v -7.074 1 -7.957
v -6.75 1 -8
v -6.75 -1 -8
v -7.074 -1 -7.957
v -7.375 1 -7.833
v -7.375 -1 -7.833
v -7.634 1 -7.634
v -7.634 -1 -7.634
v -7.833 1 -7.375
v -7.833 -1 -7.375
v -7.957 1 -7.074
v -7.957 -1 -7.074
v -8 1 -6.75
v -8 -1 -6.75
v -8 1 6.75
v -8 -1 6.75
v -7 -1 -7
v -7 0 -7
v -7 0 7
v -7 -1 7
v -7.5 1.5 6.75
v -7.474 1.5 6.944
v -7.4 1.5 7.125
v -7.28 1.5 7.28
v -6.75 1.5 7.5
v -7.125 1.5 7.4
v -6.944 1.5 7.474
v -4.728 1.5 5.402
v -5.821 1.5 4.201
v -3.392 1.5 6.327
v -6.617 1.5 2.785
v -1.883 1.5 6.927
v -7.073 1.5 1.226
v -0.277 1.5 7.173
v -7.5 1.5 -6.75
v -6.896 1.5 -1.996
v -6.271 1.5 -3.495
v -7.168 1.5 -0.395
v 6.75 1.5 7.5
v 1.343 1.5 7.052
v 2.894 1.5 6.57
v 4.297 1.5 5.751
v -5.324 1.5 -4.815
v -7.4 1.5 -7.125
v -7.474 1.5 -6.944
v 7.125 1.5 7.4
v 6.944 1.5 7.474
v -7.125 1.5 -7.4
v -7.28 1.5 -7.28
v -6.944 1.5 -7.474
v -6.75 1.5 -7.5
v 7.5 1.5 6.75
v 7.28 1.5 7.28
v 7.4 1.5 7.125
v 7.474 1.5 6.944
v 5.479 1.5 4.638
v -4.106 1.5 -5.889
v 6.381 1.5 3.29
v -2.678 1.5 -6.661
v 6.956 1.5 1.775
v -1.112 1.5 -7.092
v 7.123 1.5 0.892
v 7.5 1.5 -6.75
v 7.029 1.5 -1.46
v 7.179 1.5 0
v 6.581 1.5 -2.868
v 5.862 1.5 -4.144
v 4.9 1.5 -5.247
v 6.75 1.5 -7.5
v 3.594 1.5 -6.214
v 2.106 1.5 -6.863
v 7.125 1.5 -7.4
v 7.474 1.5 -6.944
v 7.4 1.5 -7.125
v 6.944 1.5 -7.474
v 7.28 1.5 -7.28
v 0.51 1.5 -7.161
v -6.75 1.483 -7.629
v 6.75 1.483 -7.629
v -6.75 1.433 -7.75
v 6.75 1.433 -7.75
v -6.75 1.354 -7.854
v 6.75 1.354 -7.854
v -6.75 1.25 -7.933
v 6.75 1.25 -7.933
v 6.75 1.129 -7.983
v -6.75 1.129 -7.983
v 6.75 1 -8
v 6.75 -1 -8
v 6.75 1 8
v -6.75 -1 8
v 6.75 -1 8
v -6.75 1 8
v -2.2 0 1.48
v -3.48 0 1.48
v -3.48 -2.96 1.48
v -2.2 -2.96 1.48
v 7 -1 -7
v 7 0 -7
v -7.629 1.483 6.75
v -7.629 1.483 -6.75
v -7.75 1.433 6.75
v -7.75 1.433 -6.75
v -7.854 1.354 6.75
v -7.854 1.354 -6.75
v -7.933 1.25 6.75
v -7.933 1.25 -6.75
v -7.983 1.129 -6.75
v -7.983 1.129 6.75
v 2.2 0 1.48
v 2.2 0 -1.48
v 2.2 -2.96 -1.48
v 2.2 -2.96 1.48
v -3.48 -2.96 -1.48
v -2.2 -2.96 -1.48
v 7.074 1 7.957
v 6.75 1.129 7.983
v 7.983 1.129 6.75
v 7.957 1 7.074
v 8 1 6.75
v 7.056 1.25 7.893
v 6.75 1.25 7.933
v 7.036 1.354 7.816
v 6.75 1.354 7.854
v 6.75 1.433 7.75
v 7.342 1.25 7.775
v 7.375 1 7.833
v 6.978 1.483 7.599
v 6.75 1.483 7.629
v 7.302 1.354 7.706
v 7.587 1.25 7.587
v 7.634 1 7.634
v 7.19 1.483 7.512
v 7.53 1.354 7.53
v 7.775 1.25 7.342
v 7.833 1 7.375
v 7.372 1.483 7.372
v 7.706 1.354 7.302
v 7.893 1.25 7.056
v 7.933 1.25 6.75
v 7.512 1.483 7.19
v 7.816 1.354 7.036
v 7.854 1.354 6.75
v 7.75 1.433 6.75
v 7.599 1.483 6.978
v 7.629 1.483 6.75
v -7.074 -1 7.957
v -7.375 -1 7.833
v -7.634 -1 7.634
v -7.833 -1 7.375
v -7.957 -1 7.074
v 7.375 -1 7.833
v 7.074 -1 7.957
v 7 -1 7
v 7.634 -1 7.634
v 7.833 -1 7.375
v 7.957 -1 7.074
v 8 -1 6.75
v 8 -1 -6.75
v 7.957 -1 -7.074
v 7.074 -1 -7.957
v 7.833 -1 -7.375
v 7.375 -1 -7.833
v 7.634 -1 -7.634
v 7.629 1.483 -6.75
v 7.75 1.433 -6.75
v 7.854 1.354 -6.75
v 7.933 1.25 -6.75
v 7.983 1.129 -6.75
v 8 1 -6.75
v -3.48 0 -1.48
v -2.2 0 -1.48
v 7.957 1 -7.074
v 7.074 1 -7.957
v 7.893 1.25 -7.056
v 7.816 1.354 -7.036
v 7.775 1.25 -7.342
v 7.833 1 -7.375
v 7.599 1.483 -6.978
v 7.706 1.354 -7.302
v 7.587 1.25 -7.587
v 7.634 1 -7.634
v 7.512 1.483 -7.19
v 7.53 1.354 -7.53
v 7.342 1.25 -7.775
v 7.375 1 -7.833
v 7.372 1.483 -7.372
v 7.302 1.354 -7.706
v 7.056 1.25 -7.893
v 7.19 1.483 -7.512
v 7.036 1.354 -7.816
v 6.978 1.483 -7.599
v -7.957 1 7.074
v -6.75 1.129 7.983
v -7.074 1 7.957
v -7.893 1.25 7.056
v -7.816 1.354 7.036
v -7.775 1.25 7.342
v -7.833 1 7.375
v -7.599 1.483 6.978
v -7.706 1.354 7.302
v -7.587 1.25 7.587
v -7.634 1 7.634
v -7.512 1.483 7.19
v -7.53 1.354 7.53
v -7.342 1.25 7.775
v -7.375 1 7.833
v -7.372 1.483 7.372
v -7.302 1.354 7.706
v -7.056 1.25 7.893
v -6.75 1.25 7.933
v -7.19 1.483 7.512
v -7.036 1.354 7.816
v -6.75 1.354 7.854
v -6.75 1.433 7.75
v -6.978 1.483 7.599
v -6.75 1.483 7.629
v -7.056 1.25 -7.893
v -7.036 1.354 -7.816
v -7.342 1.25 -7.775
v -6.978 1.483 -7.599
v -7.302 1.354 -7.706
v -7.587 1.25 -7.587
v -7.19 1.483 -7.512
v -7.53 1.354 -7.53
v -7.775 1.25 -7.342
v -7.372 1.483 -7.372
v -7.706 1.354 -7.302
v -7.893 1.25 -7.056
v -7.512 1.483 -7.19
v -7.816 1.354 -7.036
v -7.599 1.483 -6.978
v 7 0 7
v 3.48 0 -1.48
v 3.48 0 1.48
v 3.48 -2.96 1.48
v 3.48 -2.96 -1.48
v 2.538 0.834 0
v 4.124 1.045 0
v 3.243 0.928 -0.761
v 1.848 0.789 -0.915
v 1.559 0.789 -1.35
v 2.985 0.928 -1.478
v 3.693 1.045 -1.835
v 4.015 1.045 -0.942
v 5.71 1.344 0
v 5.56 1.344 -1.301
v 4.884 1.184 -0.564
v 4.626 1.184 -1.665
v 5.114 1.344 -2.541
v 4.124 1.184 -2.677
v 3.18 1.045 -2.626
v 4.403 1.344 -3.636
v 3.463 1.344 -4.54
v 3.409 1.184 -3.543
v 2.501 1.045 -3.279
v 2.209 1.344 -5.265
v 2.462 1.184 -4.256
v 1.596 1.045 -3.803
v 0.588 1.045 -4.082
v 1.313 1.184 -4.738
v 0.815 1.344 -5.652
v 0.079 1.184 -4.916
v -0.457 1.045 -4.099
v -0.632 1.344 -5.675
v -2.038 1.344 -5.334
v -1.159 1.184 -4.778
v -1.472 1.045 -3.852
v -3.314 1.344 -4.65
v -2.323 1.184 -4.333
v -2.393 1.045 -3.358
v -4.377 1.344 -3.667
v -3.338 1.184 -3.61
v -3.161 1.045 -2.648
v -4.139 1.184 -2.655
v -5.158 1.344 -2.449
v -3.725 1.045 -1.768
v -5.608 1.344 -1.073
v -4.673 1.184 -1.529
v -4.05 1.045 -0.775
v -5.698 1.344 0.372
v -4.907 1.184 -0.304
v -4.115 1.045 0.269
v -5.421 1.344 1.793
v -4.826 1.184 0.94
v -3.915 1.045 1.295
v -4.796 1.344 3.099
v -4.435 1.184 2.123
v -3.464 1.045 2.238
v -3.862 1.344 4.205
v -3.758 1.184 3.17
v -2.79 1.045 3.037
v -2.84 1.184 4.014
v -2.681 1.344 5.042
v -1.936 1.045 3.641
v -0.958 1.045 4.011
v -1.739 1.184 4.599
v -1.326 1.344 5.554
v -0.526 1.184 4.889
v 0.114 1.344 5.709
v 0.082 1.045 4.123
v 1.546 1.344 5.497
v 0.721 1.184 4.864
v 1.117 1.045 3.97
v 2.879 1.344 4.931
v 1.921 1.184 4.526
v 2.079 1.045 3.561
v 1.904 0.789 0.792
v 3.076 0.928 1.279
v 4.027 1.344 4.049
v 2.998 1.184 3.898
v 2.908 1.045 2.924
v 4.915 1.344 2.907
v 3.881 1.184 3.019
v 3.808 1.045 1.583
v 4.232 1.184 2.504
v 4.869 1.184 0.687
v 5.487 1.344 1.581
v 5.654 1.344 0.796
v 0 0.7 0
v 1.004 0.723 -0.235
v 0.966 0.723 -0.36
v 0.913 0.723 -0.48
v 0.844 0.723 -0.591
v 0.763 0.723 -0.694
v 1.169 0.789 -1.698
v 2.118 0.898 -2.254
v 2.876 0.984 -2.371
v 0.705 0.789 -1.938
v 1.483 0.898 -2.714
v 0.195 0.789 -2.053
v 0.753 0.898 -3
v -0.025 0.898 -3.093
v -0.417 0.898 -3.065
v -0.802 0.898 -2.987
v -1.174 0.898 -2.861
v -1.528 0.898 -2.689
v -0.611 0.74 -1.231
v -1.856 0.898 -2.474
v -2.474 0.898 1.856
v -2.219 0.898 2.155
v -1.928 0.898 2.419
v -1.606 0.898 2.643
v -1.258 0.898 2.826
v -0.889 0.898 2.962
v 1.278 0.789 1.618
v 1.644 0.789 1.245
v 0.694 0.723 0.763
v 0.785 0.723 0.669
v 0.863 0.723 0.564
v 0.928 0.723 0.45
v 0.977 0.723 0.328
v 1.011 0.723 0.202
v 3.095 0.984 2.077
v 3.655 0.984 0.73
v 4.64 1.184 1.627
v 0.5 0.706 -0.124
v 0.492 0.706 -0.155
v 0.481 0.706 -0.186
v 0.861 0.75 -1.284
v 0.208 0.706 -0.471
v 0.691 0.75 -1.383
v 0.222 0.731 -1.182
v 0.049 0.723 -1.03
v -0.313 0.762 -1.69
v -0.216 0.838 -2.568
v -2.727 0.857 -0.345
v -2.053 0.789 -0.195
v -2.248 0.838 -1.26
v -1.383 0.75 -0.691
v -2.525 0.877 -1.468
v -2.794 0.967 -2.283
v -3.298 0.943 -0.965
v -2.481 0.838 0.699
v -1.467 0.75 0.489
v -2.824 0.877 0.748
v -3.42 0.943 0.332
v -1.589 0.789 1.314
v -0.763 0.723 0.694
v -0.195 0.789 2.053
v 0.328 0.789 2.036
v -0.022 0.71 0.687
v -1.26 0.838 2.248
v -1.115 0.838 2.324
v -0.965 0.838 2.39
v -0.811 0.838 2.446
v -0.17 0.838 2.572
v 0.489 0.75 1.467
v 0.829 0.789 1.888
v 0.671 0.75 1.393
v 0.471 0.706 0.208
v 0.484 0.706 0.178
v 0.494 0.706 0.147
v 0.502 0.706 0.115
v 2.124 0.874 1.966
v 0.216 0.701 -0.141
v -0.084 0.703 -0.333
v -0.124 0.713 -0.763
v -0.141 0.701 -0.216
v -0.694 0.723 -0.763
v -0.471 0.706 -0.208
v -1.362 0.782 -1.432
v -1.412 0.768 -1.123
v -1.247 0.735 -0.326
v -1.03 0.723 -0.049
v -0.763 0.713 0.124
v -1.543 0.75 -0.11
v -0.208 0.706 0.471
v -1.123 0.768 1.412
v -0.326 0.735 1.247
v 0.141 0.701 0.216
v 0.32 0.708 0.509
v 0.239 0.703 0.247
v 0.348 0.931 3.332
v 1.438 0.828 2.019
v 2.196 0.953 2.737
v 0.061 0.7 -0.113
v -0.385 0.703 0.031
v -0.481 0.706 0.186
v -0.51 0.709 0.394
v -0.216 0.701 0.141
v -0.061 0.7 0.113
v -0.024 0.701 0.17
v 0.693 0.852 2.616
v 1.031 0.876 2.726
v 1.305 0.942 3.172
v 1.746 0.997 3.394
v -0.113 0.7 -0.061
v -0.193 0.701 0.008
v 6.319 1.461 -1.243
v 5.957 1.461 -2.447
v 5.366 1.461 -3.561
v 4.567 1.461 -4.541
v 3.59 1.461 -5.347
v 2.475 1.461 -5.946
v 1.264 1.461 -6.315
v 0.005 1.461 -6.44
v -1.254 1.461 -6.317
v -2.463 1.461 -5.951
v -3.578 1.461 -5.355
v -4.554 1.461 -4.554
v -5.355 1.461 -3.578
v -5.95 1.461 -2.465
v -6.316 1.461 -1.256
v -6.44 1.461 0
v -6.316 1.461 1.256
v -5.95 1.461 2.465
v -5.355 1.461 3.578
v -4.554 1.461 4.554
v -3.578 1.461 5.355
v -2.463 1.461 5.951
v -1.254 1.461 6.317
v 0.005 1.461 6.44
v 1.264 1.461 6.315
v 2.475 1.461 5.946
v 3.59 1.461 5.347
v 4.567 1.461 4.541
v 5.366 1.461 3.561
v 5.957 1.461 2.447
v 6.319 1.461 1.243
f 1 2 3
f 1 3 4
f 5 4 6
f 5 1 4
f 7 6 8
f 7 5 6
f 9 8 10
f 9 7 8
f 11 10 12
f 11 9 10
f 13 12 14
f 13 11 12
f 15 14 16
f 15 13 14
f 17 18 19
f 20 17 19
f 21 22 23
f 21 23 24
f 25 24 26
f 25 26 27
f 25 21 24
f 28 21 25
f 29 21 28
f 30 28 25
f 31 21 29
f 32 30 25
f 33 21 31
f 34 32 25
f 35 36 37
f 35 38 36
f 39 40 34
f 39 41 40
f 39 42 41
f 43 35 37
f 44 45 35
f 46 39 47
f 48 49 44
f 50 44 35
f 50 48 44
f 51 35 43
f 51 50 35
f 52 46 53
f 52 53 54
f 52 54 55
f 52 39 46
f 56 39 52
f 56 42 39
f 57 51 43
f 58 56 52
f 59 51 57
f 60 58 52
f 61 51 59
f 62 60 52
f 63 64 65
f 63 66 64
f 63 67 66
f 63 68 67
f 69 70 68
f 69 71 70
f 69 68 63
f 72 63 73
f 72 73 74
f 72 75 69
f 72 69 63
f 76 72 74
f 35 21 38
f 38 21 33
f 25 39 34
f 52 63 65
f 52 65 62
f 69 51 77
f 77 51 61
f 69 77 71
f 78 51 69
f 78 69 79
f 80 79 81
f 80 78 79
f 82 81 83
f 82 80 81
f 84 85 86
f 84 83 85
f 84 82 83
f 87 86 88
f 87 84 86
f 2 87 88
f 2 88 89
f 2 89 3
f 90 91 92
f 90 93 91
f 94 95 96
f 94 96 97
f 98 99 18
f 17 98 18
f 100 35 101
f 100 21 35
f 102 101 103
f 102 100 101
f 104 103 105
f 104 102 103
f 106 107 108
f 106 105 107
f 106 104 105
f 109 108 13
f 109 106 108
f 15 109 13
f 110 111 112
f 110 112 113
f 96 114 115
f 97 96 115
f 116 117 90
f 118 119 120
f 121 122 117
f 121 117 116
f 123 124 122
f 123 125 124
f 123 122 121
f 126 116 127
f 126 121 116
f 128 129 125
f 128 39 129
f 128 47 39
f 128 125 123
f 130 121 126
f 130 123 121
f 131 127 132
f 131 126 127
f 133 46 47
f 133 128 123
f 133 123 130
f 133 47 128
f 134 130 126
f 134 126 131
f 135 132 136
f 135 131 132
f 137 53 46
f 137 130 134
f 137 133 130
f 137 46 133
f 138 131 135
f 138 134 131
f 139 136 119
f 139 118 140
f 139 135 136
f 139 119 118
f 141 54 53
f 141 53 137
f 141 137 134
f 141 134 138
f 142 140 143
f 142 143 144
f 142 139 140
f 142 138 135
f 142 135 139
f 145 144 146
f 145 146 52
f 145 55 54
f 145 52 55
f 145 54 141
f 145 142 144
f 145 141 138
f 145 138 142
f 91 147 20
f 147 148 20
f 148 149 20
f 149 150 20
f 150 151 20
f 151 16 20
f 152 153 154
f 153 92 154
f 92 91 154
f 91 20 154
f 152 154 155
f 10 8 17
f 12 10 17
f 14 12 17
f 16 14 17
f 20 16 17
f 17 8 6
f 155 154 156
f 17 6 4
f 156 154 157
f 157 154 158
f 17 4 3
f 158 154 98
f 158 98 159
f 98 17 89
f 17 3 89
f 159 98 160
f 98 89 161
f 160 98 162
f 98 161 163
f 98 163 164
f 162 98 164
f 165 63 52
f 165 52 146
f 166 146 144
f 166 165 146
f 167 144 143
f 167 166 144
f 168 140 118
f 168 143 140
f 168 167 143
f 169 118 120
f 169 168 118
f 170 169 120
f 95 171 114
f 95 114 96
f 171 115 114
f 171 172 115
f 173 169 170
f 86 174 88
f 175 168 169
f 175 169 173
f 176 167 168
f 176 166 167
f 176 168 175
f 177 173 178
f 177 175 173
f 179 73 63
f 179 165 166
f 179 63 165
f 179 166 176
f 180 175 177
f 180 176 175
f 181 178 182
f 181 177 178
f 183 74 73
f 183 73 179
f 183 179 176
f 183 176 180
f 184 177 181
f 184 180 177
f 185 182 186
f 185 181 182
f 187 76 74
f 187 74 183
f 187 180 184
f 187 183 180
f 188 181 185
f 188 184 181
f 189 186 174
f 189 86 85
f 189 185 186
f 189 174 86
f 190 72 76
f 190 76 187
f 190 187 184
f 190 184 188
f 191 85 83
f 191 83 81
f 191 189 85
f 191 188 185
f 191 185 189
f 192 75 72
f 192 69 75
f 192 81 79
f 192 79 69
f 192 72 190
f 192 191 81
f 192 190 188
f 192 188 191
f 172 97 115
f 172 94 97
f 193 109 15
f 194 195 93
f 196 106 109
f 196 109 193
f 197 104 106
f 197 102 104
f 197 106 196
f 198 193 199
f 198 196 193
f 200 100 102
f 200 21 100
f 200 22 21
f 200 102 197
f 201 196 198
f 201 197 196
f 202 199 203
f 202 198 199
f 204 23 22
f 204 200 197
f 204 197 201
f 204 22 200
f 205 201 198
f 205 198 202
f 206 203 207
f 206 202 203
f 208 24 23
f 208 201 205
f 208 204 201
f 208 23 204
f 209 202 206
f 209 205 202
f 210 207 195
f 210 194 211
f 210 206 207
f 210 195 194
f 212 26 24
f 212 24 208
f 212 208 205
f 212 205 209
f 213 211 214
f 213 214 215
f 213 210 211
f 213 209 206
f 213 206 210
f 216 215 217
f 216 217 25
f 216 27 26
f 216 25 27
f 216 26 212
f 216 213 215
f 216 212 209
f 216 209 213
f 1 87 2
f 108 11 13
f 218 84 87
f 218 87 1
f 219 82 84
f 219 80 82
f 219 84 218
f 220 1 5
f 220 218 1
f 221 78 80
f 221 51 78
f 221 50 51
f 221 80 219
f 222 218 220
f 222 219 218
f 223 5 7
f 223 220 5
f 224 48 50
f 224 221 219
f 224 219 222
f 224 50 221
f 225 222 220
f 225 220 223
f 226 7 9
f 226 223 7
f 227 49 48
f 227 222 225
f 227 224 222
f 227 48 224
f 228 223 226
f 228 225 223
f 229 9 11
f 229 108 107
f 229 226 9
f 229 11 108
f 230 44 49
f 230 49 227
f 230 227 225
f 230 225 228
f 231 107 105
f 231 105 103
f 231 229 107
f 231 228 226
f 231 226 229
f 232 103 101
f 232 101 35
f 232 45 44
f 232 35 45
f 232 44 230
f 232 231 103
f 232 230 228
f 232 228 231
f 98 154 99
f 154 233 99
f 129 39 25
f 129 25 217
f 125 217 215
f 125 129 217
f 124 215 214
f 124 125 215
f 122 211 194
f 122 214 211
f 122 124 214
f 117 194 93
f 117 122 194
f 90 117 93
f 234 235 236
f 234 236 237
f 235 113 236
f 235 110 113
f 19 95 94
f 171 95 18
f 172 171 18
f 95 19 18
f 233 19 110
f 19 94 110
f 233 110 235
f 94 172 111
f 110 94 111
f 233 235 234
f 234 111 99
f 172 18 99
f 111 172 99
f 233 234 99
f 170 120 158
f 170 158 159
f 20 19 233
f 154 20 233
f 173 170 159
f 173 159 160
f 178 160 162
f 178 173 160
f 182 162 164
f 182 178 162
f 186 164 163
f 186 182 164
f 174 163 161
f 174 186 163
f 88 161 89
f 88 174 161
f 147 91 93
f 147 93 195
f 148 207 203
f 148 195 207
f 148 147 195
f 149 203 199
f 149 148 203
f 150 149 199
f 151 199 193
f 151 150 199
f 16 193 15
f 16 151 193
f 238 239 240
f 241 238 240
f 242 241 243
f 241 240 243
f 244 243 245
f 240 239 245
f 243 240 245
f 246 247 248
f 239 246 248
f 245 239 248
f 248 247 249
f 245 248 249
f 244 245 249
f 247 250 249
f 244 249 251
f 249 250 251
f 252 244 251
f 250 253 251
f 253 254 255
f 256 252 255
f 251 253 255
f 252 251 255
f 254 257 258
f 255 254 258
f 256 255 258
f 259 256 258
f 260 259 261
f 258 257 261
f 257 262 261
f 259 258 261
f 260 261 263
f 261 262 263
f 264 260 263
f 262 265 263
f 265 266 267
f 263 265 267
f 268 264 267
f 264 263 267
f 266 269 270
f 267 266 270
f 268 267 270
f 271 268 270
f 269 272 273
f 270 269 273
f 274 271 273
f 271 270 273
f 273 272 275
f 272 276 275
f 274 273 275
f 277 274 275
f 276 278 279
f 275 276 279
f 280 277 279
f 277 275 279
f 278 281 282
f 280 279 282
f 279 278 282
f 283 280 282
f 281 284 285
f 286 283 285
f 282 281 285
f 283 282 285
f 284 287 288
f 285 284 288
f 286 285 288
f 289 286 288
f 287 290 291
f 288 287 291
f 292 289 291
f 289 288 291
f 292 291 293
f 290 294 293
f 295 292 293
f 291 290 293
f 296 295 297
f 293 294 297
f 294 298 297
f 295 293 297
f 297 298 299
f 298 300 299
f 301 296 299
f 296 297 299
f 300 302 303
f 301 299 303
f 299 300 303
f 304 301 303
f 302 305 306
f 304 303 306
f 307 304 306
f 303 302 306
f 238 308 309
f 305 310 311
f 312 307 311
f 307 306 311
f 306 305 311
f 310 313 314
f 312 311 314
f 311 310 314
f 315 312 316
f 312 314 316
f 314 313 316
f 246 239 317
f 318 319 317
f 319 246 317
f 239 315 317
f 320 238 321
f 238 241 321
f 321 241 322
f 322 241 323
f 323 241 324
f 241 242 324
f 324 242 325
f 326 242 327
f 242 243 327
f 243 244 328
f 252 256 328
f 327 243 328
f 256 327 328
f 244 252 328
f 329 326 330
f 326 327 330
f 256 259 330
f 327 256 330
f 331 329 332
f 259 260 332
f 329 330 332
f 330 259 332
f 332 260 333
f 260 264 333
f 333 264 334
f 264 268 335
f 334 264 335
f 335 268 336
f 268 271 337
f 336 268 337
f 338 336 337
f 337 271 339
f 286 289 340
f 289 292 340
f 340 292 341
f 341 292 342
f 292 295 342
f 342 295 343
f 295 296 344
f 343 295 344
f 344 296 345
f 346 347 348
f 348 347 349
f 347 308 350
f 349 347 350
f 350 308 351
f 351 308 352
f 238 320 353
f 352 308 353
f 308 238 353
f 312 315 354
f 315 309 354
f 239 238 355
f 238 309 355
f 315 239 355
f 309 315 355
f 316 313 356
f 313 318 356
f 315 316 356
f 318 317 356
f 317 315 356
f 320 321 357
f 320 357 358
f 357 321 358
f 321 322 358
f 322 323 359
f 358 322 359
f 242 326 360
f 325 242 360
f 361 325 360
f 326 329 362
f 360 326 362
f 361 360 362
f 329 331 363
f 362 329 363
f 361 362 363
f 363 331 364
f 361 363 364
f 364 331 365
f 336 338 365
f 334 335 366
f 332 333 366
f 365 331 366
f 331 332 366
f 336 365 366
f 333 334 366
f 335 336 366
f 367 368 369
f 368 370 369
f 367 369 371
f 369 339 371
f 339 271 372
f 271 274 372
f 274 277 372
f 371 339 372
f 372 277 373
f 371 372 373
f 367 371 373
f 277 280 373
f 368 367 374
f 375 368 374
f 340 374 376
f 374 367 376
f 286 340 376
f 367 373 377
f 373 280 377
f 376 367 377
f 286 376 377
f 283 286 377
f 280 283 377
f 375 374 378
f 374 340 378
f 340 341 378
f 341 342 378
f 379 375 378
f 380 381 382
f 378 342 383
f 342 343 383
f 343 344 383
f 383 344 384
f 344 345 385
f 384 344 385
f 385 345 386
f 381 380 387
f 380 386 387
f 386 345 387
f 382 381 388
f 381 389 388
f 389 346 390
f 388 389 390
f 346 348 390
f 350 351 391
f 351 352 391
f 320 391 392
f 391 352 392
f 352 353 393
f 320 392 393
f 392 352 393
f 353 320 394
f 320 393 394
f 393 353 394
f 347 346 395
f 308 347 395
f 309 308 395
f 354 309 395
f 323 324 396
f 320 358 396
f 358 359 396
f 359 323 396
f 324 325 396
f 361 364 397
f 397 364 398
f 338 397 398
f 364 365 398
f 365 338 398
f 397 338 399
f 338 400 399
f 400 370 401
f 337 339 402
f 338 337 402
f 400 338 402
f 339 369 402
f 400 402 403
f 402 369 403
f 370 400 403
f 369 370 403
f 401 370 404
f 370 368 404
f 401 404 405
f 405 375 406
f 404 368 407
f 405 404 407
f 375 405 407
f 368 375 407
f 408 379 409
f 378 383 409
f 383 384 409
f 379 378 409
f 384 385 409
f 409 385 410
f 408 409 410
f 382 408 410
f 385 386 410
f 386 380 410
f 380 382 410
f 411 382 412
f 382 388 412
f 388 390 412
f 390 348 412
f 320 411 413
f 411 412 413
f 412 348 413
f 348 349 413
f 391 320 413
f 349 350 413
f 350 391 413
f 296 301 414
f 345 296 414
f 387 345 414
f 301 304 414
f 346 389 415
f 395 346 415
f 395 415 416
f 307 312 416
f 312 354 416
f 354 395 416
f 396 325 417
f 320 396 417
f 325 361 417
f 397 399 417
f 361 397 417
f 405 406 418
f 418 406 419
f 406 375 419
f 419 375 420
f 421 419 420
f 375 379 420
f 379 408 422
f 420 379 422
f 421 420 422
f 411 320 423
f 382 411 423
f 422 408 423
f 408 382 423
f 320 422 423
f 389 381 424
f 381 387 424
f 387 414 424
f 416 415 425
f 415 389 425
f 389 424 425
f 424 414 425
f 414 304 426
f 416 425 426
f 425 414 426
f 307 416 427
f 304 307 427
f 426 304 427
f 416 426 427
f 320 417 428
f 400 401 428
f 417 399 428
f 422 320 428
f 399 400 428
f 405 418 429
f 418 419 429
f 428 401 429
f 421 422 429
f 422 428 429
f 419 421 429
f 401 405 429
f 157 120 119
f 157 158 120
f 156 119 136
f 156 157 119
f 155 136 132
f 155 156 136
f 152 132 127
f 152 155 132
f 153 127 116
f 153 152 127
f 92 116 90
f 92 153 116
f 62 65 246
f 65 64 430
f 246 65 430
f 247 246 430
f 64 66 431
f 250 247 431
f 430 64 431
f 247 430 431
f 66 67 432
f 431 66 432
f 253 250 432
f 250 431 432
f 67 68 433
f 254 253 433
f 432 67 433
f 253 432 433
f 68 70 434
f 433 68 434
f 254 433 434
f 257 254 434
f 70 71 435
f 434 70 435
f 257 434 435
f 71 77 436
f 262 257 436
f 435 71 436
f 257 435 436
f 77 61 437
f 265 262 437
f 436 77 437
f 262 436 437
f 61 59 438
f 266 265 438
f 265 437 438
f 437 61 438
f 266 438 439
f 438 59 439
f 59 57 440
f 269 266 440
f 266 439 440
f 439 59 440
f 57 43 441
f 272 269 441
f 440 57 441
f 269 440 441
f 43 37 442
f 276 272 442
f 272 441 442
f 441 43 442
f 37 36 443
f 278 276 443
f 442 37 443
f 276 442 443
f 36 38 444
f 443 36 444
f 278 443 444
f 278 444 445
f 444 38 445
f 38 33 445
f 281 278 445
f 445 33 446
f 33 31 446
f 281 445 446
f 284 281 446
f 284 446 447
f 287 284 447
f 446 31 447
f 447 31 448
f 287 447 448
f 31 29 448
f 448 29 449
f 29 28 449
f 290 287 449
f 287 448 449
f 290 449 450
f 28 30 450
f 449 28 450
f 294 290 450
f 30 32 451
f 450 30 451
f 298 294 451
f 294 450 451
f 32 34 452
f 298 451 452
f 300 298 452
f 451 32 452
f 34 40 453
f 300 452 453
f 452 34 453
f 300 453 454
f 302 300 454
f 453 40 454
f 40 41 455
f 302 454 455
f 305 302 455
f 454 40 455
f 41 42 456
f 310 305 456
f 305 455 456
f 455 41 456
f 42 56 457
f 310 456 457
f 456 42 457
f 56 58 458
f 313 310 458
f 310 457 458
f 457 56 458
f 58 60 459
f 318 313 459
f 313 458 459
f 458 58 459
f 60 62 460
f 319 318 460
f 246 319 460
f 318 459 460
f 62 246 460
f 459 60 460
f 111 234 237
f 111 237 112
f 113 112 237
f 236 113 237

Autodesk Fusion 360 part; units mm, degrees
sketch "plan" plane through (0, 0, 0) normal (0, 1, 0) x (1, 0, 0)
  line L0 (8, 8) -> (-8, 8)
  line L1 (-8, 8) -> (-8, -8)
  line L2 (-8, -8) -> (8, -8)
  line L3 (8, -8) -> (8, 8)
  line L4 (7, 7) -> (-7, 7)
  line L5 (-7, 7) -> (-7, -7)
  line L6 (-7, -7) -> (7, -7)
  line L7 (7, -7) -> (7, 7)
  line L8 (-3.48, 0) -> (3.48, 0) construction
  line L9 (-3.48, -1.48) -> (-2.2, -1.48)
  line L10 (-2.2, -1.48) -> (-2.2, 1.48)
  line L11 (-2.2, 1.48) -> (-3.48, 1.48)
  line L12 (-3.48, 1.48) -> (-3.48, -1.48)
  line L13 (-7, 7) -> (7, -7) construction
  line L14 (-8, -8) -> (8, 8) construction
  line L15 (2.2, -1.48) -> (3.48, -1.48)
  line L16 (3.48, -1.48) -> (3.48, 1.48)
  line L17 (3.48, 1.48) -> (2.2, 1.48)
  line L18 (2.2, 1.48) -> (2.2, -1.48)
  dimension "d1" = 16
  dimension "d2" = 16
  dimension "d3" = 1
  dimension "d5" = 1
  dimension "d10" = 6.96
  dimension "d11" = 1.28
  dimension "d12" = 2.96
  dimension "d13" = 1.28
  dimension "d14" = 2.96
extrude "Extrude1" add sketch "plan" along normal blind 1.5 contours L0 L1 L2 L3 | L4 L5 L6 L7 | L9 L10 L11 L12 | L15 L16 L17 L18
extrude "Extrude2" add sketch "plan" against normal blind 1 contours L0 L1 L2 L3
extrude "Extrude3" add sketch "plan" against normal blind 2.96 contours L9 L10 L11 L12 | L15 L16 L17 L18
sketch "indent" plane through (0, 0, 0) normal (0, 0, 1) x (1, 0, 0)
  line L0 (8, -1) -> (8, 1.5)
  line L1 (8, 1.5) -> (8, -1)
  line L2 (8, 1.5) -> (-8, 1.5)
  line L3 (-8, 1.5) -> (8, 1.5)
  line L4 (-8, -1) -> (-8, 1.5)
  line L5 (-8, 1.5) -> (-8, -1)
  line L6 (-8, 0) -> (8, 0)
  line L7 (0, 1.5) -> (0, 0.7)
  spline S0 degree 5 poles (-6.4, 1.5) (-6.144, 1.4393) (-5.632, 1.3233) (-4.864, 1.1651) (-3.84, 0.9865) (-2.56, 0.8208) (-1.28, 0.7177) (0, 0.6824) (1.28, 0.7177) (2.56, 0.8208) (3.84, 0.9865) (4.864, 1.1651) (5.632, 1.3233) (6.144, 1.4393) (6.4, 1.5) knots 0 0 0 0 0 0 0.1 0.2 0.3 0.4 0.5 0.6 0.7 0.8 0.9 1 1 1 1 1 1
  point P0 (-8, 0)
  point P1 (8, 0)
  point P2 (-6.4, 1.5)
  point P3 (6.4, 1.5)
  dimension "d17" = 1.6
  dimension "d18" = 1.6
  dimension "d20" = 0.8
revolve "Revolve1" cut sketch "indent" angle 360 about axis through (0, 1.75, 0) along (0, 1, 0) contours L2 L3 L7 S0 picked at (0.7111, 0.9984)
fillet "Fillet1" radius 1.25 4 edges at (-8, 0.25, 8) (8, 0.25, 8) (8, 0.25, -8) (-8, 0.25, -8)
fillet "Fillet2" radius 0.5 8 edges at (7.6339, 1.5, -7.6339) (0, 1.5, -8) (-7.6339, 1.5, -7.6339) (-8, 1.5, 0) (-7.6339, 1.5, 7.6339) (0, 1.5, 8) (7.6339, 1.5, 7.6339) (8, 1.5, 0)
fillet "Fillet3" radius 7 1 edges at (-5.9669, 1.5, -2.3143)
equation "d13 = d11"
equation "d14 = d12"
equation "d18 = d17"
